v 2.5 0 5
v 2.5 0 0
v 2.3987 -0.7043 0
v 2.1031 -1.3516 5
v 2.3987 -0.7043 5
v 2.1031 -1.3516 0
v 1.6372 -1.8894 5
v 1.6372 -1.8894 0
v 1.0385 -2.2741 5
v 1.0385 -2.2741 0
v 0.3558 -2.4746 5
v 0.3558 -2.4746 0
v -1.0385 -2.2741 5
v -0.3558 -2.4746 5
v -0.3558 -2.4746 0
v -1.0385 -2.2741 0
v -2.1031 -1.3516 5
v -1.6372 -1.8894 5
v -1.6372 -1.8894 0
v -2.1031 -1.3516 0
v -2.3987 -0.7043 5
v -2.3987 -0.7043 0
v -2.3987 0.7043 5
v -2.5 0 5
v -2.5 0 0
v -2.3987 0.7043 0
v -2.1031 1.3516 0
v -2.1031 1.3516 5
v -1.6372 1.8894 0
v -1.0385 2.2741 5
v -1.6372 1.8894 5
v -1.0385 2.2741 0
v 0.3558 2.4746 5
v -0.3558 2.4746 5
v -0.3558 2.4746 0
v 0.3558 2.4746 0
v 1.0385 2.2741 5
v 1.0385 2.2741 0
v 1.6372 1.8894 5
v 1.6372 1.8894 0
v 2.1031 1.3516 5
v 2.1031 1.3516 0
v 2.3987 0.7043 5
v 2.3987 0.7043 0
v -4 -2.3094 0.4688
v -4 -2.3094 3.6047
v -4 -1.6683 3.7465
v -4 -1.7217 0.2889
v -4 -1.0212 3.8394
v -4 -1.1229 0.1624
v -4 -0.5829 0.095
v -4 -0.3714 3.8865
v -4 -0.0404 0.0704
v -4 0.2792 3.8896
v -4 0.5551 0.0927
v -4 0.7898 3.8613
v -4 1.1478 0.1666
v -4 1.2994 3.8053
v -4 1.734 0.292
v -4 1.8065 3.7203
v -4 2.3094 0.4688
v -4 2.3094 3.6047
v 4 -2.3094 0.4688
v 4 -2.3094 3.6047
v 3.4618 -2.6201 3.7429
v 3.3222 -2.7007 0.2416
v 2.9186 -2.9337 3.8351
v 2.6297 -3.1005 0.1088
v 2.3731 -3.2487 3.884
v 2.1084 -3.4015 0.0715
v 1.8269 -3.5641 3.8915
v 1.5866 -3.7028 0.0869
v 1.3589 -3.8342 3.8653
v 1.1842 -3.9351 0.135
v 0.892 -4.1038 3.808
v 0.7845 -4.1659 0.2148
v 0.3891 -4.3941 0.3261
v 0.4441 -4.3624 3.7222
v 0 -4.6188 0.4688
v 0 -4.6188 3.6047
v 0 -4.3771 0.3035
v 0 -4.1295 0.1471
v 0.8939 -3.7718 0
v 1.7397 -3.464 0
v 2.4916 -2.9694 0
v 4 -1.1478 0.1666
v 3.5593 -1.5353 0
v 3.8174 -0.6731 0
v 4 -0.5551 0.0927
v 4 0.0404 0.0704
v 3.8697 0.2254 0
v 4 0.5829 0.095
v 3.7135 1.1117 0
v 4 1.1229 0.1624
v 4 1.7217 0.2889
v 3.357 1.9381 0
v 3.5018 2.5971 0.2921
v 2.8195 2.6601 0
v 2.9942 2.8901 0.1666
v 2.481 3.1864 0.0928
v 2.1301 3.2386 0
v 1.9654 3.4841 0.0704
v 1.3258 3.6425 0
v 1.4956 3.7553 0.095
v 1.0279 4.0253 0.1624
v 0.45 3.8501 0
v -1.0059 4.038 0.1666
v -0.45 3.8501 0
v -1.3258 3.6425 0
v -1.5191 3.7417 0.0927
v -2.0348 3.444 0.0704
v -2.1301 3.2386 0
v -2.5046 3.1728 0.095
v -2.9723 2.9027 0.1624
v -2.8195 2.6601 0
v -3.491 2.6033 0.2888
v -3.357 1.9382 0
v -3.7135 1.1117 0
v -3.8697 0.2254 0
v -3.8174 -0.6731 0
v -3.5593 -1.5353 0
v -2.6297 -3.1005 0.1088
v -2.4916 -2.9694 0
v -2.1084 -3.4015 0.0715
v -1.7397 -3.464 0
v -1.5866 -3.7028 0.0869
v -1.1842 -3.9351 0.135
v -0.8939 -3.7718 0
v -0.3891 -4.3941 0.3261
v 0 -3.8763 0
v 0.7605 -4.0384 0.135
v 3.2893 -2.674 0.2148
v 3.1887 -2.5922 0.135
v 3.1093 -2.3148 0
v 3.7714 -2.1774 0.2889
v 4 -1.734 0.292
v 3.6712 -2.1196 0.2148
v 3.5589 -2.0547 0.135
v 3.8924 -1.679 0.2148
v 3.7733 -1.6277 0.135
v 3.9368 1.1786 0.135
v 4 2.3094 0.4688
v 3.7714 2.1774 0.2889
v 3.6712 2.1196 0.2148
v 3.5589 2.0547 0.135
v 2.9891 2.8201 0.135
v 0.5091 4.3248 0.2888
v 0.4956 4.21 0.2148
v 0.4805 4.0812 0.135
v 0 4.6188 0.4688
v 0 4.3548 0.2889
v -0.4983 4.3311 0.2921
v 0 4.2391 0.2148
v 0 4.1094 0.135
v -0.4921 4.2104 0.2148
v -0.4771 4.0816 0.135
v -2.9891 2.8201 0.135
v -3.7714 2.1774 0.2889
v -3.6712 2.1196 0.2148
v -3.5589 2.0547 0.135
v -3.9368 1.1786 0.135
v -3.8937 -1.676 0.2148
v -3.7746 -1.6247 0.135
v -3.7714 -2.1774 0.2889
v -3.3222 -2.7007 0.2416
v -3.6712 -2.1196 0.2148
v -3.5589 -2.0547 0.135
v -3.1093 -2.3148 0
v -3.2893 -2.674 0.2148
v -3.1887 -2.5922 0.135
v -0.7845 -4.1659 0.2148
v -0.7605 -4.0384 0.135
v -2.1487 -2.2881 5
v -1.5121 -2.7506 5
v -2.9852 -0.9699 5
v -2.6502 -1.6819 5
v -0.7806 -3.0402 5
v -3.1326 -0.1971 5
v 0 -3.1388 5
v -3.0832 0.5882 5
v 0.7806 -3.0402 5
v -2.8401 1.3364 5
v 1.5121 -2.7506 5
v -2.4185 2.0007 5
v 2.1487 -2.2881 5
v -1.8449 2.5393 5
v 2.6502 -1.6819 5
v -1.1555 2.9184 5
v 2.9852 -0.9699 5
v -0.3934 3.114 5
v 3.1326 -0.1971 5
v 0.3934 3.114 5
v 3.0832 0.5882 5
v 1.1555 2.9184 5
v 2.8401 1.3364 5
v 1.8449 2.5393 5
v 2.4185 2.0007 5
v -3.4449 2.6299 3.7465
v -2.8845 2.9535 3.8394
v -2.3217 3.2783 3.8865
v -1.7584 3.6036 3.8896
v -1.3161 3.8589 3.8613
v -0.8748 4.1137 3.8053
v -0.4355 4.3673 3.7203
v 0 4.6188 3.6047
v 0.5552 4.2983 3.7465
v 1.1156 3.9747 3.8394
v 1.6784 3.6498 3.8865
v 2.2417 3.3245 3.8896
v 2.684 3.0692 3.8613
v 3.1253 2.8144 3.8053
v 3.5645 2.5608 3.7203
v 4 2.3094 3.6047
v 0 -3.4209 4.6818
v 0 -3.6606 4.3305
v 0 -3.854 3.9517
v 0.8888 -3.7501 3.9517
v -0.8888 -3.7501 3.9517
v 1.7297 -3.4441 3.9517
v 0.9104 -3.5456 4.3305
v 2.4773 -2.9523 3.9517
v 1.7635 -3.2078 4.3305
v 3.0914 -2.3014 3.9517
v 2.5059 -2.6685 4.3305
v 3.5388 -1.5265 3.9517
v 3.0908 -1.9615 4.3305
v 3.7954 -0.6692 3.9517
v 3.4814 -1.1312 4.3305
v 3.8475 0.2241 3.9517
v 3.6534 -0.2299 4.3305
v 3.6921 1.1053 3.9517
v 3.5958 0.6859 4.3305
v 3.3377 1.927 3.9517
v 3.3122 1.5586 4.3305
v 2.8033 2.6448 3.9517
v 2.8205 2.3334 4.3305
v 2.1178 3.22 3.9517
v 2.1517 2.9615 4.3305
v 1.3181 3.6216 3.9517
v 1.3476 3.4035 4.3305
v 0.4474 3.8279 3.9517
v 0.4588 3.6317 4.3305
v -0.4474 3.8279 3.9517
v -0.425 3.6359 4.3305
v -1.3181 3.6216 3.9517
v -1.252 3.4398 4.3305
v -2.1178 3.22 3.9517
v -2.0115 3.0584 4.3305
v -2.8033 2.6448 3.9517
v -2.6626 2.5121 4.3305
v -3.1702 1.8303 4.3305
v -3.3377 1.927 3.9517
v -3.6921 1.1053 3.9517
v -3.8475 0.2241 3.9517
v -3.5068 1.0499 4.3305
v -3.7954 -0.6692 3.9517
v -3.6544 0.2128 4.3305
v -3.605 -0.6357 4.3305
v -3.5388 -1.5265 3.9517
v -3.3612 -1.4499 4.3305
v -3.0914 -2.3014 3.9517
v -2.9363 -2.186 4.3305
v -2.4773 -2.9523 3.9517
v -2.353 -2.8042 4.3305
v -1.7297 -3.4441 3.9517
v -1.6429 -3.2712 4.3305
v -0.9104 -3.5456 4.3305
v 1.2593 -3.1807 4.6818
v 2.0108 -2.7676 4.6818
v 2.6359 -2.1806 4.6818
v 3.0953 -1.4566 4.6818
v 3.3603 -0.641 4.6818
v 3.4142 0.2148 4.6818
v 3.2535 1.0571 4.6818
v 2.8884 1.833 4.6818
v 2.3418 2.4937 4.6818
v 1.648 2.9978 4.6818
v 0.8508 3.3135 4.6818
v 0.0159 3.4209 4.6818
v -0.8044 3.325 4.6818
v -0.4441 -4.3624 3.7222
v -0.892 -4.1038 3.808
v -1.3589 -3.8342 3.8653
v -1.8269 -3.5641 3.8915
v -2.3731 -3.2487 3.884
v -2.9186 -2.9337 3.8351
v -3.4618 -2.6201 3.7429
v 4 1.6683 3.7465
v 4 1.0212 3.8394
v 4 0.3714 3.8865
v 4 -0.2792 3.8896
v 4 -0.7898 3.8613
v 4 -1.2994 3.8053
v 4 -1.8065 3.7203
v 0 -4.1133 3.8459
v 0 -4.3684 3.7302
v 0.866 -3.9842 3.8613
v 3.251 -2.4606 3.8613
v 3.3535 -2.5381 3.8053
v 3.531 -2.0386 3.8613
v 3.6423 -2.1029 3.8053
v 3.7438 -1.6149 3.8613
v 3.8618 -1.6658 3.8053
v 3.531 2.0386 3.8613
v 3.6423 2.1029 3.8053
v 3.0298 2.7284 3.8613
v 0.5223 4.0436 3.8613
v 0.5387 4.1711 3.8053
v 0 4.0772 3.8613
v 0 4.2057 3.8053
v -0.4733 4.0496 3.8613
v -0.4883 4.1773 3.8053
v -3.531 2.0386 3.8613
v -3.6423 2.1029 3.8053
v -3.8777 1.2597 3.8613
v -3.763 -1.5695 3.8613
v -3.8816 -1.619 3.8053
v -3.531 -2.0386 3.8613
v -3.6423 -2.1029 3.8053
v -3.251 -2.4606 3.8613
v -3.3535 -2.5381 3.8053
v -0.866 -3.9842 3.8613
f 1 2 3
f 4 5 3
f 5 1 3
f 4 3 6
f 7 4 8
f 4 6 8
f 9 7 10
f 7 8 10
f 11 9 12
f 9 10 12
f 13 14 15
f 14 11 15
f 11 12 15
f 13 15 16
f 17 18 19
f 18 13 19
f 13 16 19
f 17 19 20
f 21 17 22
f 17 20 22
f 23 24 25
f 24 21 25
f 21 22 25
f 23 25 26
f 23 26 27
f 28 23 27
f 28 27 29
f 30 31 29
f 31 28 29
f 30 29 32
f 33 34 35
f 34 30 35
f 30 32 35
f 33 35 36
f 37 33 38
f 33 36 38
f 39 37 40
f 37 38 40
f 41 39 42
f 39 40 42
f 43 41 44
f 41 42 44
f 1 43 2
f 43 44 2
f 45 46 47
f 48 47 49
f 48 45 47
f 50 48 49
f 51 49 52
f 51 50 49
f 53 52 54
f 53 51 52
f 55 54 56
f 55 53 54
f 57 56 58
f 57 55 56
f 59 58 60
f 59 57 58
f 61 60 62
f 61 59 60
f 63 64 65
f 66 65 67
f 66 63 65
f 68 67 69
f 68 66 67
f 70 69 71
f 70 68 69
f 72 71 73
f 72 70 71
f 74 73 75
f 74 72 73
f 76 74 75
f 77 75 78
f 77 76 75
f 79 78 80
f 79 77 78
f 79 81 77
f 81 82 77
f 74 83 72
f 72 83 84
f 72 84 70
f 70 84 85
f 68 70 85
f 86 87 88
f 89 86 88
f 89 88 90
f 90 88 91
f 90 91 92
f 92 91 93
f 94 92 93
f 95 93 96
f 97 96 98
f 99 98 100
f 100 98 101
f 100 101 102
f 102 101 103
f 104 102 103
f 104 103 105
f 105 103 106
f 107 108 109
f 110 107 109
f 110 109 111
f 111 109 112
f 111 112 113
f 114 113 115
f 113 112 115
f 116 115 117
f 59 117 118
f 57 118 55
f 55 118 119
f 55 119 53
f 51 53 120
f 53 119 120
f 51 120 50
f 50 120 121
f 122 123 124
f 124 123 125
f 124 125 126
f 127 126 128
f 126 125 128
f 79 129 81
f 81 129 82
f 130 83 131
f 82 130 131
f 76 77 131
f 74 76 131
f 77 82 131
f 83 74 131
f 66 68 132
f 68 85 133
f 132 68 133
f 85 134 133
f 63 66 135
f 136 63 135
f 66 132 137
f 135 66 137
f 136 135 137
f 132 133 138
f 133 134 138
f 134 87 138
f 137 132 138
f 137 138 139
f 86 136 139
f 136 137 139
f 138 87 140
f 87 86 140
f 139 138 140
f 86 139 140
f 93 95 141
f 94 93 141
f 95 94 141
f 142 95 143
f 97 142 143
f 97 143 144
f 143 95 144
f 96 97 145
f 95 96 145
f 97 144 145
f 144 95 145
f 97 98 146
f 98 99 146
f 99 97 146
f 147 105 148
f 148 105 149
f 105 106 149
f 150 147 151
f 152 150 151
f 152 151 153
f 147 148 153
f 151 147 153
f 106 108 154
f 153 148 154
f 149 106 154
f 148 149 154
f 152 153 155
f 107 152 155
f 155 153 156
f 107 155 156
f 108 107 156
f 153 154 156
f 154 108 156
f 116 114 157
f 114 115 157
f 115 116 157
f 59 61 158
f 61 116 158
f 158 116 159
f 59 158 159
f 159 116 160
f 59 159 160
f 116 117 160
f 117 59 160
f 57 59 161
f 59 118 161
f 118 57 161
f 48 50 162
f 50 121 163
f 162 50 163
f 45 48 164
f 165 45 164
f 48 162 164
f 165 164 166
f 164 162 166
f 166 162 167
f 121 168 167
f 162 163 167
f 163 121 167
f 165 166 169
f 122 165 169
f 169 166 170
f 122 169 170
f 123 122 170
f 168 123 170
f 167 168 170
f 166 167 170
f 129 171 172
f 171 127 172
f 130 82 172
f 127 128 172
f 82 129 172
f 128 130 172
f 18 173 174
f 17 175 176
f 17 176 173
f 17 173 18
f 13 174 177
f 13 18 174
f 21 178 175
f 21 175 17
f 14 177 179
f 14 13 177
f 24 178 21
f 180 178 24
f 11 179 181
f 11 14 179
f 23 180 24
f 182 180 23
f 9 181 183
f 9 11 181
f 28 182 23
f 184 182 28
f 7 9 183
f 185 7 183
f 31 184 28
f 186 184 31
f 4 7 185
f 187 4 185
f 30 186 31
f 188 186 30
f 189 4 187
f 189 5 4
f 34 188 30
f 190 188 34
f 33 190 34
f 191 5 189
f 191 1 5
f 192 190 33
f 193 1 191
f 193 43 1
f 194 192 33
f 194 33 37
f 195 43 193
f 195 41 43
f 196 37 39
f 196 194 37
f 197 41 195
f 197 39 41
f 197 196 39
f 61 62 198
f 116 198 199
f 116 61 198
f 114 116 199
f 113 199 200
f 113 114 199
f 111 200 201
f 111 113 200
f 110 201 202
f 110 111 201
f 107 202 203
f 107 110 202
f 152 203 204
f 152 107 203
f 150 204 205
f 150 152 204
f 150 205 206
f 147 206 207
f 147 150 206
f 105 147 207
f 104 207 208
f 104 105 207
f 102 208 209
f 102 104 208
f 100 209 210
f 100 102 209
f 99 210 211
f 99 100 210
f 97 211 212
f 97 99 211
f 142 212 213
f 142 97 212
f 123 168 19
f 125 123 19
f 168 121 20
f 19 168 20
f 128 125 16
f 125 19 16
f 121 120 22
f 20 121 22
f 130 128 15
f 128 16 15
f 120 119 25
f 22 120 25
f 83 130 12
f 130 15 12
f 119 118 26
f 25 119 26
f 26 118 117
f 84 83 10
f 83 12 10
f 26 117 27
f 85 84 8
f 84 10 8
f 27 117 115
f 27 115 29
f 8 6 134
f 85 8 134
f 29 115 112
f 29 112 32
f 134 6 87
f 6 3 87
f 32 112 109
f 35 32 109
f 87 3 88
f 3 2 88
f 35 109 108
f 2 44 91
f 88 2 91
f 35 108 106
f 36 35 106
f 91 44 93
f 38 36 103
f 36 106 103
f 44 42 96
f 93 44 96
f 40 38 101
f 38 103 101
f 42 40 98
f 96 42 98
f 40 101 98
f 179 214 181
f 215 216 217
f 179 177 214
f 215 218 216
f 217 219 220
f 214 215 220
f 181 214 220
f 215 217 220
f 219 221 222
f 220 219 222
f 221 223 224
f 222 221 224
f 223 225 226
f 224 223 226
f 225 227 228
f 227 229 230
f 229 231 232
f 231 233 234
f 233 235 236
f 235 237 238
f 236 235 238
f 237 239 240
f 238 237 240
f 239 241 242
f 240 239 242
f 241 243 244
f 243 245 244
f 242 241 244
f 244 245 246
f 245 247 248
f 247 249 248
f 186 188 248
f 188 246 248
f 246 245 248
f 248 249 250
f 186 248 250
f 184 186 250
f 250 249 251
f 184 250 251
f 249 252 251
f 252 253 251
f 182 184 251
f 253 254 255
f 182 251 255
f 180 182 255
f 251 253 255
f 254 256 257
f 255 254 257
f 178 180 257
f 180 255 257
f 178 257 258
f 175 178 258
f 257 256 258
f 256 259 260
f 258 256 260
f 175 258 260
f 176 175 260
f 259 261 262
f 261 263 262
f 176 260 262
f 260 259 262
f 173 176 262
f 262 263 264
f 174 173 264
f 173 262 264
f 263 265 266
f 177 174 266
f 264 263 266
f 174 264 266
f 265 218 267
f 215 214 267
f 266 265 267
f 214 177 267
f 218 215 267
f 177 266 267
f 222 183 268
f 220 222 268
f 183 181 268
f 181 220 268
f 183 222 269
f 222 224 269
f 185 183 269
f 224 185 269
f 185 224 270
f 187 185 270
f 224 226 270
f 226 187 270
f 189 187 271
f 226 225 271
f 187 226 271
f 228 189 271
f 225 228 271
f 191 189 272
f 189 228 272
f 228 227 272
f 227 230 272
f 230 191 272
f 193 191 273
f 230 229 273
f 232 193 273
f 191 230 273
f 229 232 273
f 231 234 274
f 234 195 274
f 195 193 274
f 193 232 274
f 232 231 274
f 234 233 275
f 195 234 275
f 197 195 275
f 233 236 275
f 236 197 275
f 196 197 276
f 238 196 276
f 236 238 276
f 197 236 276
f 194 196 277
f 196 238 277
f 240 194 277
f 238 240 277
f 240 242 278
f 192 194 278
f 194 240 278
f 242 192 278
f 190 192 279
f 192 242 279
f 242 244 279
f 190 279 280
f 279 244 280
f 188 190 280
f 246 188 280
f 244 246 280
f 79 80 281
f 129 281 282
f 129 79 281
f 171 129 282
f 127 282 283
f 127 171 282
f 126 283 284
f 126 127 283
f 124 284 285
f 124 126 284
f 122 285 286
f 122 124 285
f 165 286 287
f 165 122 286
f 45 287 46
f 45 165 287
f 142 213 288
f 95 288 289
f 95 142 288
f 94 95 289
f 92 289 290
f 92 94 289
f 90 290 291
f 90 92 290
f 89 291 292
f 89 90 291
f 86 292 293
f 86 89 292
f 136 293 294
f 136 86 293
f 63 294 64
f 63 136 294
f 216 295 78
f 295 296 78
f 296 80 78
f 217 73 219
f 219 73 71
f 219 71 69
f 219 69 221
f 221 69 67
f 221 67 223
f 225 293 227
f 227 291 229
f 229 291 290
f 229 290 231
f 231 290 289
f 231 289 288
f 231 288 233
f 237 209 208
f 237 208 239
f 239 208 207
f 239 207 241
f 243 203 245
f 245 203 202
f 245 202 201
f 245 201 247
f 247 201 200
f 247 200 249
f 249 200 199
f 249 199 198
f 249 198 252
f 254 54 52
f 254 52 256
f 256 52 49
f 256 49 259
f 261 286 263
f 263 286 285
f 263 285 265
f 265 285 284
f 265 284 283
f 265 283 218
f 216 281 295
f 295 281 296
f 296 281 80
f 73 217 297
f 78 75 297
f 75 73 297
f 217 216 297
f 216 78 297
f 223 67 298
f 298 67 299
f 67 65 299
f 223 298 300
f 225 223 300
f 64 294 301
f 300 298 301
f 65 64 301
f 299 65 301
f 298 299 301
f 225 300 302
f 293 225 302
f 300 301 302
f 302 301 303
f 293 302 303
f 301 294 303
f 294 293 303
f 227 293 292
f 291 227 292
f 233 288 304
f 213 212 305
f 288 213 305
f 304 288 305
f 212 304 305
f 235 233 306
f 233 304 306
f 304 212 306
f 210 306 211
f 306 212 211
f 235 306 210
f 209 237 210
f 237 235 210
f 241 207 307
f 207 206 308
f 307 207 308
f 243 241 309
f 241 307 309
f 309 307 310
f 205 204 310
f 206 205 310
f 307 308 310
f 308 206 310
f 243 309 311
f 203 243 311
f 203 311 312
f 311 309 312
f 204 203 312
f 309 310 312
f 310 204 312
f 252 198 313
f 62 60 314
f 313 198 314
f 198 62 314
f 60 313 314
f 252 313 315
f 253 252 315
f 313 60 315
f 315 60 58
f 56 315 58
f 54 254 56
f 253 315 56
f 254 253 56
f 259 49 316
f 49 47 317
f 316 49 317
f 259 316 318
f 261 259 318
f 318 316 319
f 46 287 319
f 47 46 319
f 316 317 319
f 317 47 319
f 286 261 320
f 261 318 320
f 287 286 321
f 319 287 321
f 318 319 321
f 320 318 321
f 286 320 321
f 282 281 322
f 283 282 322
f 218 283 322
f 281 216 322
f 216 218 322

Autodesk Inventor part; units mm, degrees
ref_plane "YZ Plane" through (0, 0, 0) normal (1, 0, 0) x (0, 1, 0)
ref_plane "XZ Plane" through (0, 0, 0) normal (0, 1, 0) x (-1, 0, 0)
ref_plane "XY Plane" through (0, 0, 0) normal (0, 0, 1) x (1, 0, 0)
sketch "Sketch1" plane through (0, 0, 0) normal (0, 0, 1) x (1, 0, 0)
  line L0 (4, -2.3094) -> (0, -4.6188)
  line L1 (0, -4.6188) -> (-4, -2.3094)
  line L2 (-4, -2.3094) -> (-4, 2.3094)
  line L3 (-4, 2.3094) -> (0, 4.6188)
  line L4 (0, 4.6188) -> (4, 2.3094)
  line L5 (4, 2.3094) -> (4, -2.3094)
  circle A0 centre (0, 0) radius 2.5
  dimension "d0" = 8
  dimension "d1" = 5
extrude "Extrusion1" add sketch "Sketch1" along normal blind 5
sketch "Sketch4" plane through (0, 0, 0) normal (1, 0, 0) x (0, 1, 0)
  line L0 (-4.6188, 0) -> (-2.3094, 0) projected
  line L1 (-4.6188, 0) -> (-4.6188, 5) projected
  line L2 (-2.3094, 5) -> (-4.6188, 5) projected
  line L3 (-2.3094, 0) -> (-2.3094, 5) projected
  line L4 (2.3094, 0) -> (4.6188, 0) projected
  line L5 (2.3094, 0) -> (2.3094, 5) projected
  line L6 (4.6188, 5) -> (2.3094, 5) projected
  line L7 (4.6188, 0) -> (4.6188, 5) projected
  arc A0 (-3.1388, 5) -> (-3.854, 3.9517) centre (-0.7691, 2.615) ccw
  arc A1 (-3.854, 3.9517) -> (-4.6188, 3.6047) centre (-1.2465, -2.8098) ccw
  line L8 (0, 0) -> (0, 9.301) construction
  arc A2 (3.7221, 0) -> (4.6188, 0.5597) centre (0, 6.9619) ccw
  arc A3 (-4.6188, 0.4688) -> (-3.8763, 0) centre (0, 6.9619) ccw
revolve "Revolution3" cut sketch "Sketch4" angle 360 about axis through (0, 0, 0) along (0, 0, 1) contours L1 A3 L0 | L1 L2 A0 A1
thread "Thread1" size "M5x0.8" class "6H" standard "ANSI Metric M Profile" full length
properties part number "M5 Nylock"
